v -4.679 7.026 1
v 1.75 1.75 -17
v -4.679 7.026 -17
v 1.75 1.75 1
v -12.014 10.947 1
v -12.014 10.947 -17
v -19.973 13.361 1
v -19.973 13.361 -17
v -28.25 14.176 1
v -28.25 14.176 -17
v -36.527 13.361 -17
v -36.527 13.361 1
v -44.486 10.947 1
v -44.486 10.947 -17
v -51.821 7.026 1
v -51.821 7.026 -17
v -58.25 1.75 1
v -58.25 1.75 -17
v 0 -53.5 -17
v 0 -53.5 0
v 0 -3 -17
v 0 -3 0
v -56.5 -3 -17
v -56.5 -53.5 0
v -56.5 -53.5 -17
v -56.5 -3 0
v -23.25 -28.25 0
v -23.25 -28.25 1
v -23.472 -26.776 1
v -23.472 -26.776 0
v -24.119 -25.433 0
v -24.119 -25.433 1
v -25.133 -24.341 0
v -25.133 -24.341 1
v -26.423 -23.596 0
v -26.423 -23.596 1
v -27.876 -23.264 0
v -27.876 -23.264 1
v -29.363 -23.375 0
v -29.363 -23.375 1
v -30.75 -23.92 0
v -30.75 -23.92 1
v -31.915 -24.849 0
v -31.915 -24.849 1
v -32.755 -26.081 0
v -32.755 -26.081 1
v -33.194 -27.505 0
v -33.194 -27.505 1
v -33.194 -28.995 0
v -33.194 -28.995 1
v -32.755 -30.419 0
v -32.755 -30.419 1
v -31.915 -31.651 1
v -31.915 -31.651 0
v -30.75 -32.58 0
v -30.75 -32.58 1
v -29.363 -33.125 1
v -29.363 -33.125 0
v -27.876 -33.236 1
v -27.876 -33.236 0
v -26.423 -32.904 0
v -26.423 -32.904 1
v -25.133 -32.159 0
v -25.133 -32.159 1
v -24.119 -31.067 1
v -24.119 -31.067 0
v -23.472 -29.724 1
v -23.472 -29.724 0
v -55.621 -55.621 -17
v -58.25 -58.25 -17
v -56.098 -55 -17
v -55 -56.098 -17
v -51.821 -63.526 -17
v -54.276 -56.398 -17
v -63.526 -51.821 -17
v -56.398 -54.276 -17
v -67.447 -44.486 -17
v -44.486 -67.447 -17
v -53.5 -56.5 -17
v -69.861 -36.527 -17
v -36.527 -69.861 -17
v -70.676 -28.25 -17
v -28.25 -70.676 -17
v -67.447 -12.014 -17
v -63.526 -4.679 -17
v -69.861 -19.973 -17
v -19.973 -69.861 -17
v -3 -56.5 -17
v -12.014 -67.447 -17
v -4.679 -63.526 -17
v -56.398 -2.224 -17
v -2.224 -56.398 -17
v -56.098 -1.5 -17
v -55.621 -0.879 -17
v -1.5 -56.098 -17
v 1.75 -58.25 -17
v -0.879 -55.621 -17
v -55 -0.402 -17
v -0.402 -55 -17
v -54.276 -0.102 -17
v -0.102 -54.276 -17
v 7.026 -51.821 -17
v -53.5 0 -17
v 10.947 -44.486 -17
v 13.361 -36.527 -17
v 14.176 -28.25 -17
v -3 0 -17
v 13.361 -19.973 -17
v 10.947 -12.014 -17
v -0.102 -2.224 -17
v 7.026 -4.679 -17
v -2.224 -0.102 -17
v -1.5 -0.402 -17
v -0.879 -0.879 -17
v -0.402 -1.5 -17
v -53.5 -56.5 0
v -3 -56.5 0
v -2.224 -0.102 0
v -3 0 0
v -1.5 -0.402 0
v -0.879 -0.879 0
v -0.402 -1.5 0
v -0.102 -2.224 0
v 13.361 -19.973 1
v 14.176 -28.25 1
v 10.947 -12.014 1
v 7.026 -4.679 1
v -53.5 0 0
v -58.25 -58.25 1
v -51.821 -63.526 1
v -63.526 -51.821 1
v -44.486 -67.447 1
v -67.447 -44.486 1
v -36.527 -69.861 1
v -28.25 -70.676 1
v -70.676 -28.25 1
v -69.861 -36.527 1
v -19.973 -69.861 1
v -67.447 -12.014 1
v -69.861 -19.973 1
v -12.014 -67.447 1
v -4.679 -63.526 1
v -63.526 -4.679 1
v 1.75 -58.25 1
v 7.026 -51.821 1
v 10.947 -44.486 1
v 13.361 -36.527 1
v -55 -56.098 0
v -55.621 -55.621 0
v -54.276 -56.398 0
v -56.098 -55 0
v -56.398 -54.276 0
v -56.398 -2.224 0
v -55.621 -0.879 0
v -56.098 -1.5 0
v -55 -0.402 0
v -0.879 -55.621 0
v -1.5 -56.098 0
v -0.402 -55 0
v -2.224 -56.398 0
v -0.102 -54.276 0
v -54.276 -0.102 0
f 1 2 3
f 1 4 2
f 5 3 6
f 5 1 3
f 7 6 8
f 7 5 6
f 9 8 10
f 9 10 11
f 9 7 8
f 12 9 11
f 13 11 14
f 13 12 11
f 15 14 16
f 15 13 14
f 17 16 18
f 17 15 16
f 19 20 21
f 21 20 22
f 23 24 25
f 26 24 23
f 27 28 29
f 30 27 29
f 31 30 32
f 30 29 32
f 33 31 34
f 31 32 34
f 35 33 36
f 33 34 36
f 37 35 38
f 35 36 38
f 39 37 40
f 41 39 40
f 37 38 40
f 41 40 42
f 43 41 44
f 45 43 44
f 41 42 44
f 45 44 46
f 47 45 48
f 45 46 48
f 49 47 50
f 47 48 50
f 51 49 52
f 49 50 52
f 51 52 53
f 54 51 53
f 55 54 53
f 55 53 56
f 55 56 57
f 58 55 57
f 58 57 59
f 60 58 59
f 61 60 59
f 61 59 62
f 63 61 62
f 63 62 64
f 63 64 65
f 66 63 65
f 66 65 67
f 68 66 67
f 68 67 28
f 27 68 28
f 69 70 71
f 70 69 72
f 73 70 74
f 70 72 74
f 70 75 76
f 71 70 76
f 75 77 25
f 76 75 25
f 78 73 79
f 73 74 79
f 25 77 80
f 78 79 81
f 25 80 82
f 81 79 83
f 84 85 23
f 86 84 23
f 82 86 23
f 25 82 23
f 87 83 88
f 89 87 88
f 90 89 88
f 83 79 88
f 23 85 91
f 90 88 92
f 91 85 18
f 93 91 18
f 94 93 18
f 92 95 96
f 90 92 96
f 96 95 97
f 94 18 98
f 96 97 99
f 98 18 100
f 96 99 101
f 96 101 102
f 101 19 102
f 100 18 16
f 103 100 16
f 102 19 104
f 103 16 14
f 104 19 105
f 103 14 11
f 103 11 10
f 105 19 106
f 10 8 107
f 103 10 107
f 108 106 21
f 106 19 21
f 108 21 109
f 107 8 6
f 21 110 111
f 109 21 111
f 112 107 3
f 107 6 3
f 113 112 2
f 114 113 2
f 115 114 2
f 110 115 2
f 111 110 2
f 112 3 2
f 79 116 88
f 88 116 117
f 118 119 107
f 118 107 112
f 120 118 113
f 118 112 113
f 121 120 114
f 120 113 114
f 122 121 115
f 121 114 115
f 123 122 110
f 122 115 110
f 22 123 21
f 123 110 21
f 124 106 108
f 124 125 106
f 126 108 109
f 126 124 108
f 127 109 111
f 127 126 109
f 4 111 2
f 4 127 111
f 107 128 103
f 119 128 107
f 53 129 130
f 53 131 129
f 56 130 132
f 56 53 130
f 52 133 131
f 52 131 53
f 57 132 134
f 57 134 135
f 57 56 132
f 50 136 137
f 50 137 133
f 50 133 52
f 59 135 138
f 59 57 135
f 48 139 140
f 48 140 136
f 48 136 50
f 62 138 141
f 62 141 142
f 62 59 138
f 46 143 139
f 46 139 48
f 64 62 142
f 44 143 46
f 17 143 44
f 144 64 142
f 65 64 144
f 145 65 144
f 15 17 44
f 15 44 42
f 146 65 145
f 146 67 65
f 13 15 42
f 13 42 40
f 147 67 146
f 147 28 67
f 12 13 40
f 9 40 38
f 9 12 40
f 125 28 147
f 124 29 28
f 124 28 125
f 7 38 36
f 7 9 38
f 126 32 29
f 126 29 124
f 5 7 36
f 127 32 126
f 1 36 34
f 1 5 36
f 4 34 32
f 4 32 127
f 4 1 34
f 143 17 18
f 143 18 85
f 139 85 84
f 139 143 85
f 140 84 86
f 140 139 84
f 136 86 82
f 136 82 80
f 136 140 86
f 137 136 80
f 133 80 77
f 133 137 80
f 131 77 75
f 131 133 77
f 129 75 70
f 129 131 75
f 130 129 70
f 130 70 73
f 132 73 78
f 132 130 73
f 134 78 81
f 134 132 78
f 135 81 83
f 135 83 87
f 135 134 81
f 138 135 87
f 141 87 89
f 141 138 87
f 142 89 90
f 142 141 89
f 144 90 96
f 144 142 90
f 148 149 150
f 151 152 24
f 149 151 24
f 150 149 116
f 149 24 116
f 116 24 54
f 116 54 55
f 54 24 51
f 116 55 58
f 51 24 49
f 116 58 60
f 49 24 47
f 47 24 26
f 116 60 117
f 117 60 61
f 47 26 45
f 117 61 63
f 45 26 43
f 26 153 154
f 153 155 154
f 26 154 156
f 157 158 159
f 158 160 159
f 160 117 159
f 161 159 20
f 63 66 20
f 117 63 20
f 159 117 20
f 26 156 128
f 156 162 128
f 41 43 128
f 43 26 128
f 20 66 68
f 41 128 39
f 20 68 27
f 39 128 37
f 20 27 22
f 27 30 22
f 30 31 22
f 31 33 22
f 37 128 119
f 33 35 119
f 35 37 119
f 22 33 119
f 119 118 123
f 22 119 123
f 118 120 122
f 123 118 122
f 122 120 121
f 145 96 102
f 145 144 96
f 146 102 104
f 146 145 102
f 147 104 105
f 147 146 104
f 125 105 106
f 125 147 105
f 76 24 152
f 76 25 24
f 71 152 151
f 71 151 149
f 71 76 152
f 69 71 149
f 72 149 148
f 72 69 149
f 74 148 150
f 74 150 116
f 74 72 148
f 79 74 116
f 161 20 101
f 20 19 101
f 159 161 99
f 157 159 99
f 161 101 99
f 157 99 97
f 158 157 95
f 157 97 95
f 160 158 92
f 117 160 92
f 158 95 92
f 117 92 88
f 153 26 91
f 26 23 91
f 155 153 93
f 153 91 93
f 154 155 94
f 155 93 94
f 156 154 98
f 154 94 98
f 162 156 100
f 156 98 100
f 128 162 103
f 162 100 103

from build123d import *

# Parameters (mm, degrees)
F0_W     = 60
F0_H     = 60
F0_W_2   = 56.5
F0_H_2   = 56.5
F1_DEPTH = 17
F2_DEPTH = 1
F3_DEPTH = 17
F4_R     = 5
F5_DEPTH = 25
F6_R     = 3


with BuildPart() as f1:
    # F0 (on Top) → F1 (new body)
    with BuildSketch(Plane.XY):
        with Locations((-28.25, -28.25)):
            Rectangle(F0_W, F0_H)
        with Locations((-28.25, -28.25)):
            Rectangle(F0_W_2, F0_H_2, mode=Mode.SUBTRACT)
    extrude(amount=-F1_DEPTH)

    # F0 (on Top) → F2 (join)
    with BuildSketch(Plane.XY):
        with Locations((-28.25, -28.25)):
            Rectangle(F0_W, F0_H)
        with Locations((-28.25, -28.25)):
            Rectangle(F0_W_2, F0_H_2, mode=Mode.SUBTRACT)
        with BuildLine():
            ThreePointArc((1.75, 1.75), (-28.25, 14.176407), (-58.25, 1.75))
            Line((-58.25, 1.75), (1.75, 1.75))
        make_face()
        with BuildLine():
            Line((1.75, 1.75), (1.75, -58.25))
            ThreePointArc((1.75, -58.25), (10.946889, -44.485883), (14.176407, -28.25))
            ThreePointArc((14.176407, -28.25), (10.946889, -12.014117), (1.75, 1.75))
        make_face()
        with BuildLine():
            Line((1.75, -58.25), (-58.25, -58.25))
            ThreePointArc((-58.25, -58.25), (-28.25, -70.676407), (1.75, -58.25))
        make_face()
        with BuildLine():
            ThreePointArc((-58.25, 1.75), (-70.676407, -28.25), (-58.25, -58.25))
            Line((-58.25, -58.25), (-58.25, 1.75))
        make_face()
        with Locations((-28.25, -28.25)):
            Rectangle(F0_W_2, F0_H_2)
    extrude(amount=F2_DEPTH)

    # F0 (on Top) → F3 (join)
    with BuildSketch(Plane.XY):
        with BuildLine():
            ThreePointArc((1.75, 1.75), (-28.25, 14.176407), (-58.25, 1.75))
            Line((-58.25, 1.75), (1.75, 1.75))
        make_face()
        with BuildLine():
            ThreePointArc((-58.25, 1.75), (-70.676407, -28.25), (-58.25, -58.25))
            Line((-58.25, -58.25), (-58.25, 1.75))
        make_face()
        with BuildLine():
            Line((1.75, 1.75), (1.75, -58.25))
            ThreePointArc((1.75, -58.25), (10.946889, -44.485883), (14.176407, -28.25))
            ThreePointArc((14.176407, -28.25), (10.946889, -12.014117), (1.75, 1.75))
        make_face()
        with BuildLine():
            Line((1.75, -58.25), (-58.25, -58.25))
            ThreePointArc((-58.25, -58.25), (-28.25, -70.676407), (1.75, -58.25))
        make_face()
    extrude(amount=-F3_DEPTH)

    # F4 (on face) → F5 (cut)
    with BuildSketch(Plane.XY.offset(1)):
        with Locations((-28.25, -28.25)):
            Circle(F4_R)
    extrude(amount=-F5_DEPTH, mode=Mode.SUBTRACT)

    # F6
    f6_edges = [f1.edges().sort_by_distance(p)[0] for p in [
        (0, 0, -8.5),
        (-56.5, 0, -8.5),
        (-56.5, -56.5, -8.5),
        (0, -56.5, -8.5),
    ]]
    fillet(f6_edges, radius=F6_R)


solid = f1.part
